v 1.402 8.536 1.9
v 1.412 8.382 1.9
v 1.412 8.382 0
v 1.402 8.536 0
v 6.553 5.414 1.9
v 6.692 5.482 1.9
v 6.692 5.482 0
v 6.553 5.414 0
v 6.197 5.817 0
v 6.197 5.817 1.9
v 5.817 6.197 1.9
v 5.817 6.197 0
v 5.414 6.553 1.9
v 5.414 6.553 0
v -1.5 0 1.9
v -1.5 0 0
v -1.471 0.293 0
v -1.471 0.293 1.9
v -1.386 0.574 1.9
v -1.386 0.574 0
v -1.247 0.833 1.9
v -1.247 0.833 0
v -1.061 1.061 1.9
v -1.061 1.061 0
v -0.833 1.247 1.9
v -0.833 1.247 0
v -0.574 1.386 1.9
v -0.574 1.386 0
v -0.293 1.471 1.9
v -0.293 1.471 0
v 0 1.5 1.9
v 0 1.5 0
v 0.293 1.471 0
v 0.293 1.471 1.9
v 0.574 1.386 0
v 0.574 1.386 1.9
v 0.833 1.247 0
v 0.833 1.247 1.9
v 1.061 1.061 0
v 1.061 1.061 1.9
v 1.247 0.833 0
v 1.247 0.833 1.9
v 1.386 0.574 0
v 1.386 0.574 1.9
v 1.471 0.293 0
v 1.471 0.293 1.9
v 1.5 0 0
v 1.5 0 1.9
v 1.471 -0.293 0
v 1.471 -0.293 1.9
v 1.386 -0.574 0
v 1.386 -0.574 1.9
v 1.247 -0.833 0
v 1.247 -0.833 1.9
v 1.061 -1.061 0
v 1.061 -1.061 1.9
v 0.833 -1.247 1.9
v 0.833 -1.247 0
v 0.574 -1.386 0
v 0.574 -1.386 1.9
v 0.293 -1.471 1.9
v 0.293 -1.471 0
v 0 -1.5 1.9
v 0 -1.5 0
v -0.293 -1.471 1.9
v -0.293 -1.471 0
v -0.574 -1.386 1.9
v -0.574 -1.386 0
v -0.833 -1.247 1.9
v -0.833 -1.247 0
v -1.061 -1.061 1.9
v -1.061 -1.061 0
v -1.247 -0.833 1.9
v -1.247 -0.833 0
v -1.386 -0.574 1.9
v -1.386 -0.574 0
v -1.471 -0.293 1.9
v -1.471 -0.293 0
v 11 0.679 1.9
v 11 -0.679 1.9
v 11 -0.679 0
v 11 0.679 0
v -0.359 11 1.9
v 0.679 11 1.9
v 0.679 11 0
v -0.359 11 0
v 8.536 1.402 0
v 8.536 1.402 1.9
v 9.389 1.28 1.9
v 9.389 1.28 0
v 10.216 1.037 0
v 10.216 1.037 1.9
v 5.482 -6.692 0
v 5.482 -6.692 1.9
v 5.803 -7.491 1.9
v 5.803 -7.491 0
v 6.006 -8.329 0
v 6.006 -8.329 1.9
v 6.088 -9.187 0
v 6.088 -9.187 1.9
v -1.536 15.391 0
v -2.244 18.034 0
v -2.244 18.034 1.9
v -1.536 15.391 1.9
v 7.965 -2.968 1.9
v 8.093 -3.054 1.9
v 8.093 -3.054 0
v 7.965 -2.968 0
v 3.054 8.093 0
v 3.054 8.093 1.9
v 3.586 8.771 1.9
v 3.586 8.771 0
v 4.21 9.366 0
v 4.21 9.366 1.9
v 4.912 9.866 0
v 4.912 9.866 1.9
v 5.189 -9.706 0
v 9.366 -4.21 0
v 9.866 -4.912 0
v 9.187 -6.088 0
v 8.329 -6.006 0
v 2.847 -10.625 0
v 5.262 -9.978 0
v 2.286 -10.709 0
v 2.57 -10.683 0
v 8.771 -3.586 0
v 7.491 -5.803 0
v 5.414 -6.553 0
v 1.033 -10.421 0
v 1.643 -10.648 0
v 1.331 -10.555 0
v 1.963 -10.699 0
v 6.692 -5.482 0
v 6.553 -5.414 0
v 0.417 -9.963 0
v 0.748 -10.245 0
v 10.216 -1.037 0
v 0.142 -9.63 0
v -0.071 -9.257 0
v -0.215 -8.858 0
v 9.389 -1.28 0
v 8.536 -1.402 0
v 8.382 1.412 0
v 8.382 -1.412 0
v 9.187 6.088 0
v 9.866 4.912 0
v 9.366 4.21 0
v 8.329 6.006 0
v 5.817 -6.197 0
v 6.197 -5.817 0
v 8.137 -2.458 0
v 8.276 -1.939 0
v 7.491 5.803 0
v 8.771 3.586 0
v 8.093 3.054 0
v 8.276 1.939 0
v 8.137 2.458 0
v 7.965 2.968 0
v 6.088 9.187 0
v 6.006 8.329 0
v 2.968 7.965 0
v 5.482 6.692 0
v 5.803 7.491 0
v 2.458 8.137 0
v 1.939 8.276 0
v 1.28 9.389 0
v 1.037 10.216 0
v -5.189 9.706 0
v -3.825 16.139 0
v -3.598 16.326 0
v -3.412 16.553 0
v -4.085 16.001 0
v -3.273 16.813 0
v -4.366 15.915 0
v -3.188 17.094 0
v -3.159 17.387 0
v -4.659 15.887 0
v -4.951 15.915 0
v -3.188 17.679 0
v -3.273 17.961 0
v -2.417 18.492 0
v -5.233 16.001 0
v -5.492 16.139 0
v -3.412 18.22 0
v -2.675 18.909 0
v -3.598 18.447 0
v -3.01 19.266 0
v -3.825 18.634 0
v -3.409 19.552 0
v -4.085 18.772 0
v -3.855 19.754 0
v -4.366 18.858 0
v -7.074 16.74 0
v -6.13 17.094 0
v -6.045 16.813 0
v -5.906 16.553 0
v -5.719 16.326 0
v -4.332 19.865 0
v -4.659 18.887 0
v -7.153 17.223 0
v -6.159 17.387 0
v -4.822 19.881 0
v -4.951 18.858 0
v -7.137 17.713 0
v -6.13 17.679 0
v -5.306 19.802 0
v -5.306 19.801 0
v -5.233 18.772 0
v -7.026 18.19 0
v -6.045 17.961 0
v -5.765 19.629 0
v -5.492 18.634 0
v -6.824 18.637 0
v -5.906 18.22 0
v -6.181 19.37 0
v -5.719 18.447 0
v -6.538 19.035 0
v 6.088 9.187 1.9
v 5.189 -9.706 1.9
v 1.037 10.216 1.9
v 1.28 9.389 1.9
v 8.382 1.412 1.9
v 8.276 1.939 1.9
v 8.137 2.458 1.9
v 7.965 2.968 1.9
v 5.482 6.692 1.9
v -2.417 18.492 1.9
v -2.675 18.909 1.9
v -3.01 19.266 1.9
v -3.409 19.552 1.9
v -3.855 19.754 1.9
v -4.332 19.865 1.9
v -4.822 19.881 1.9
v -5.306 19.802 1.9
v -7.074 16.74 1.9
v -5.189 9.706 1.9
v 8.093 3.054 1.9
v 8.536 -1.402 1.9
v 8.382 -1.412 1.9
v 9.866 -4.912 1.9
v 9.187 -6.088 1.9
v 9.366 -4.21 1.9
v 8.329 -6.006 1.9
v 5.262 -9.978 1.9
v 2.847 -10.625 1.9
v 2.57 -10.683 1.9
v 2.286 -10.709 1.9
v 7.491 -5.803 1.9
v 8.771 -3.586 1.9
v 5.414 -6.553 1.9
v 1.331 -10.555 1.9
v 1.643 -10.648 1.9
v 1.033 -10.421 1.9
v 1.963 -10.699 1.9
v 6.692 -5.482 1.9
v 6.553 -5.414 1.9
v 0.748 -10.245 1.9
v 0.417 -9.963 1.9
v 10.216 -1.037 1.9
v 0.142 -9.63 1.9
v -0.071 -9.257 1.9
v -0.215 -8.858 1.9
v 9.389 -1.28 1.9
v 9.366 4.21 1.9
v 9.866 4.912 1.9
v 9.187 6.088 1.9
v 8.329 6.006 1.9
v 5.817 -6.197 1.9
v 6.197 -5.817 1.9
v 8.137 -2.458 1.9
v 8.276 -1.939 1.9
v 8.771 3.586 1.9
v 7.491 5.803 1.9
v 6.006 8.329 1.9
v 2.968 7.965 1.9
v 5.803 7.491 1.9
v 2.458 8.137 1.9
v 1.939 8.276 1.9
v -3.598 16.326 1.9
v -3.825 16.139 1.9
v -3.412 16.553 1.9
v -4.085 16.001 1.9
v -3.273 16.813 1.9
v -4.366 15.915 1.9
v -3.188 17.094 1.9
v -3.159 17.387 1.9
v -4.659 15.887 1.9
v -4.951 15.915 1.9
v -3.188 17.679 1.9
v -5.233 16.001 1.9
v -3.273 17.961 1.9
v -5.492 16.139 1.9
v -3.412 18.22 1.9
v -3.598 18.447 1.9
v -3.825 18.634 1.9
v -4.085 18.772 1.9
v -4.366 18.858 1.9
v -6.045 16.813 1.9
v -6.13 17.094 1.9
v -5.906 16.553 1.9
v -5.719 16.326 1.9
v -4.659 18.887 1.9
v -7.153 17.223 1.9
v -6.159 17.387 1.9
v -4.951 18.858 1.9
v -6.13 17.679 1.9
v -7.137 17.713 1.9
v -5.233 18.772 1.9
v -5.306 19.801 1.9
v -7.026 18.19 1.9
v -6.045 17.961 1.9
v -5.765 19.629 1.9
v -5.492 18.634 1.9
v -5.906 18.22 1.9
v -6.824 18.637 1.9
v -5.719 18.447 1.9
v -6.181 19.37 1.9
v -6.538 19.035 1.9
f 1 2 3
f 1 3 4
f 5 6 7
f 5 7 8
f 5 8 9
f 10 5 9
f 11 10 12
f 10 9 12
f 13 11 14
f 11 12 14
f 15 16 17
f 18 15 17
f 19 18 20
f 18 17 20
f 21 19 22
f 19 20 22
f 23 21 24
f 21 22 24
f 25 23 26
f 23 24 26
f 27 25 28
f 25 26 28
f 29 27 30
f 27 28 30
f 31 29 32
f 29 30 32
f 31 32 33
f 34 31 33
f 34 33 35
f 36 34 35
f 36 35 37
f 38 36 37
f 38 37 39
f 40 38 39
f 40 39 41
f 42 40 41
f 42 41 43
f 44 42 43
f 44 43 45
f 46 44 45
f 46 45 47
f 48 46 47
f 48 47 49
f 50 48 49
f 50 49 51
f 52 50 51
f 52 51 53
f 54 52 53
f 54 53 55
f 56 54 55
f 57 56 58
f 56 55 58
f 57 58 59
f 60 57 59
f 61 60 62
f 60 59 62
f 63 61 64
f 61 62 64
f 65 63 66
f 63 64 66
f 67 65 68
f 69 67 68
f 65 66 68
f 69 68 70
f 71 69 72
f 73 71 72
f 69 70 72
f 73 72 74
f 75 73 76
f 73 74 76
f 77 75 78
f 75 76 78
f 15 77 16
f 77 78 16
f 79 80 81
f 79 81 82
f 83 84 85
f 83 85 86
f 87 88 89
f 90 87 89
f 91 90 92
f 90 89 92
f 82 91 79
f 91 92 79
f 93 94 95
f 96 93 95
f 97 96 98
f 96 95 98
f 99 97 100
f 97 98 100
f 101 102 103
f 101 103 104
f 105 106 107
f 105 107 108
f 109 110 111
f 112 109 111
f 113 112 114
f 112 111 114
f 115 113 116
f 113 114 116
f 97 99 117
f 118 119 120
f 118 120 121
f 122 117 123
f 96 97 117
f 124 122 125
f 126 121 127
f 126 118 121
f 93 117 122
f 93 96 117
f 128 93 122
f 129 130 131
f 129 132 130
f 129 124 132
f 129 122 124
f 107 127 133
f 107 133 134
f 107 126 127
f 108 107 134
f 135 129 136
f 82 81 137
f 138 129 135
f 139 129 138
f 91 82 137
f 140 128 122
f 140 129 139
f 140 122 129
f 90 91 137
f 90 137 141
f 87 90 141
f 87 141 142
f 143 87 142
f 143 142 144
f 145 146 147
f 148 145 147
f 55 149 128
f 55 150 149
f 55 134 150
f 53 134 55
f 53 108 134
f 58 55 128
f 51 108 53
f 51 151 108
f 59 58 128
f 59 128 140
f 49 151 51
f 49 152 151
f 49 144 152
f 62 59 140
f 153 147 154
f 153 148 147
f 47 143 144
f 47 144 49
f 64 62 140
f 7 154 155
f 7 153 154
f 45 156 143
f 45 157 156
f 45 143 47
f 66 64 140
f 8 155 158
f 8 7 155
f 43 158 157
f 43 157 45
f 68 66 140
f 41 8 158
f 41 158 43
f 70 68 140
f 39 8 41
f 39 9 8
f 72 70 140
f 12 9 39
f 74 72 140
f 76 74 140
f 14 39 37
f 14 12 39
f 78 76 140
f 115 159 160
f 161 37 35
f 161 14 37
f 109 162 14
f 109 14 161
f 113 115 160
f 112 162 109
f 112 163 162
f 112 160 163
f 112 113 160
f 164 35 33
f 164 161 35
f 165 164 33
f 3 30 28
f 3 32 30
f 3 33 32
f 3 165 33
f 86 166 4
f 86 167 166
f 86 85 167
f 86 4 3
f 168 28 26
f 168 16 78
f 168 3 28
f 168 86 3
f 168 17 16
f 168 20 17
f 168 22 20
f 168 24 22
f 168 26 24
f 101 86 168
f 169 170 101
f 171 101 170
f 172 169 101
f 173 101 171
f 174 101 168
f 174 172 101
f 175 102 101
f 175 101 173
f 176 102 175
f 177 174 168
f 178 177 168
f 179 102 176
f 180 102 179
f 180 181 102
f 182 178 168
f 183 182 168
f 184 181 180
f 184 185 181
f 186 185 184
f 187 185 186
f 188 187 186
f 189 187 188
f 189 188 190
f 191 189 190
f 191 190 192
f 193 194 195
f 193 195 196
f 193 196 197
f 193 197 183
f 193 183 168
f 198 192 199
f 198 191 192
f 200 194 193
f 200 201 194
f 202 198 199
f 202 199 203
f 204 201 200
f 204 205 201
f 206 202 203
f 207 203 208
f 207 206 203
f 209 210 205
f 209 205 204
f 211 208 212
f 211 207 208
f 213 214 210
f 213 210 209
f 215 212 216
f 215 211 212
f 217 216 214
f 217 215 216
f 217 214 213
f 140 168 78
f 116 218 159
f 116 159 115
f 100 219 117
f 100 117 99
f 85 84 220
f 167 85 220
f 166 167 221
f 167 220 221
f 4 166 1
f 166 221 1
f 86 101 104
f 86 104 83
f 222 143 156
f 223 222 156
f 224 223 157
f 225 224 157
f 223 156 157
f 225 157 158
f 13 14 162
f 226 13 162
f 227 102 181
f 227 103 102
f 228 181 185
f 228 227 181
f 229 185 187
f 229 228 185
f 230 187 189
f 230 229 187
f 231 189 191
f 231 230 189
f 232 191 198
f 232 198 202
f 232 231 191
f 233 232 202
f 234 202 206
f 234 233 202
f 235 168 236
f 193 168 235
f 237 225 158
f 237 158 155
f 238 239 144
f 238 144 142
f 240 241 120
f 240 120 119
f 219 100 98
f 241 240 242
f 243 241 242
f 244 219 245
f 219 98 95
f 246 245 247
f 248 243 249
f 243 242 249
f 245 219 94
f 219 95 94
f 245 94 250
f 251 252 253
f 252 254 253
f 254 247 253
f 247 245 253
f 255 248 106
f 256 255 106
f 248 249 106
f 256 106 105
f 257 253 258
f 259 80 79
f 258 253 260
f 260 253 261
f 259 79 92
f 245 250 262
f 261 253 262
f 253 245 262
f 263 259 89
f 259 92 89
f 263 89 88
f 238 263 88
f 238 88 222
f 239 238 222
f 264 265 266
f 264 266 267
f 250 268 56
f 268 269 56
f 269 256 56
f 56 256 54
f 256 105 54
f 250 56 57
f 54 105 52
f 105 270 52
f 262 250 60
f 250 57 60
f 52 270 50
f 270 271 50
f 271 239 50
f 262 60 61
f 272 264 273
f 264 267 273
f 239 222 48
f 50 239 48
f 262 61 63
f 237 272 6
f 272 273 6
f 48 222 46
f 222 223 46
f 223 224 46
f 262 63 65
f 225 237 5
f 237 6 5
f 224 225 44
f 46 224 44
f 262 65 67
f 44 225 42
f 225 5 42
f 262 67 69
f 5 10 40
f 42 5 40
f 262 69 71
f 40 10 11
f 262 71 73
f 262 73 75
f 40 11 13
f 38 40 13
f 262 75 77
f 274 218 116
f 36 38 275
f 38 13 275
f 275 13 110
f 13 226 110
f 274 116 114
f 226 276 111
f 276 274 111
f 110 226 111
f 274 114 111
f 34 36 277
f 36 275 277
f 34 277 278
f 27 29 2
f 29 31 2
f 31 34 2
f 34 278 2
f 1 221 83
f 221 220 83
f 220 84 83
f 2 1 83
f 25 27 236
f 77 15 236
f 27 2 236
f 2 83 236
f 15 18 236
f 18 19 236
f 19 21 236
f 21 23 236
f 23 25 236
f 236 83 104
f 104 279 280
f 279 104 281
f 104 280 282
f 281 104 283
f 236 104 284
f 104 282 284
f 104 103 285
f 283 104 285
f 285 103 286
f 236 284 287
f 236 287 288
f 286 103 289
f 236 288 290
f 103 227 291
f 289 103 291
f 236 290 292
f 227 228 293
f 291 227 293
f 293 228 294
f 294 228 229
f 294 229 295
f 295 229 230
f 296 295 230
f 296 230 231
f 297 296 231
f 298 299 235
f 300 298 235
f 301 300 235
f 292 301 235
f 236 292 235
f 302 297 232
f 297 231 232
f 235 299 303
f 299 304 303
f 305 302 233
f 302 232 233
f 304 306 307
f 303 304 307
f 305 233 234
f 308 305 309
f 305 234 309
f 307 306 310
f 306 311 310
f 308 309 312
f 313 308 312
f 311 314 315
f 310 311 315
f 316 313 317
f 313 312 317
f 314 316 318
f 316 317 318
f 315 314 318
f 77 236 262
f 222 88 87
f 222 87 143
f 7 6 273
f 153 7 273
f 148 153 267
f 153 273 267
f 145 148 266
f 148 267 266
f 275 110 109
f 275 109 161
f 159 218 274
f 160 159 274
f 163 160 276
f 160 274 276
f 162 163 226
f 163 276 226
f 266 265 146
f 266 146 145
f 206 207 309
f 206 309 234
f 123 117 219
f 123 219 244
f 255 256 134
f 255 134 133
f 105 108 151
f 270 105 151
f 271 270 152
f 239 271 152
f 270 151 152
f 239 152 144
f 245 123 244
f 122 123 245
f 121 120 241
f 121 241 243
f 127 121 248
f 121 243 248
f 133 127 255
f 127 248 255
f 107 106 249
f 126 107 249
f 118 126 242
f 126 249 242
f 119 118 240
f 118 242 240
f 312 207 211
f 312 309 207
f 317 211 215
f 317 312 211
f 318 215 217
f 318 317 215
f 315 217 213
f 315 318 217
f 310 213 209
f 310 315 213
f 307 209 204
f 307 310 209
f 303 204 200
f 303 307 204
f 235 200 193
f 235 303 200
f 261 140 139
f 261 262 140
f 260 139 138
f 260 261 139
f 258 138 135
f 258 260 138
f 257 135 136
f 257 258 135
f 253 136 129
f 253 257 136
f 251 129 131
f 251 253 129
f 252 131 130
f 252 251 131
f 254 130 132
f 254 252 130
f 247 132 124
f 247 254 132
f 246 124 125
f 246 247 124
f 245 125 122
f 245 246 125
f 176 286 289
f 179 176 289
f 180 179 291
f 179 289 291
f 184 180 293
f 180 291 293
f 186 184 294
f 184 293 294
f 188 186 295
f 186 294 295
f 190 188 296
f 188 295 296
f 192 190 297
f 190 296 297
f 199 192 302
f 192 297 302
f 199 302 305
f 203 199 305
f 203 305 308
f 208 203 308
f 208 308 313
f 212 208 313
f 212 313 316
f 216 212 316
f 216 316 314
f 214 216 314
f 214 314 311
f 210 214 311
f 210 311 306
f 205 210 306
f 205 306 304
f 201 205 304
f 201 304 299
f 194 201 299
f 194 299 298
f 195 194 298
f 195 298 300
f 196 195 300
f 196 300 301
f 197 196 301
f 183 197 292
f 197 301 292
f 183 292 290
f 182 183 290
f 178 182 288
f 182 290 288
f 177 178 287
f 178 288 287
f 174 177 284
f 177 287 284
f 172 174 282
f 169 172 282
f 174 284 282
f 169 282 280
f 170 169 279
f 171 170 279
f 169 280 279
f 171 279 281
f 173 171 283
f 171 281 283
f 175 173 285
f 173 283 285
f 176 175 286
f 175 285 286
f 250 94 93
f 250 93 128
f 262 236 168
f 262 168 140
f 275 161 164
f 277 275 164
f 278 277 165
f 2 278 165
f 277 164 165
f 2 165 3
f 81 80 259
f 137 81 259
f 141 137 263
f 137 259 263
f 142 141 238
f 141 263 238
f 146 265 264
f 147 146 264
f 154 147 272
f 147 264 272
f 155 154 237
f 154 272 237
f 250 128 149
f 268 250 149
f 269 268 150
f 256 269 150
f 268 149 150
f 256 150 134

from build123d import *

# Parameters (mm, degrees)
SKETCH1_R           = 8.5
BOSS_EXTRUDE1_DEPTH = 1.9
BOSS_EXTRUDE2_DEPTH = 1.9
CIRPATTERN2_COUNT   = 12
FILLET5_R           = 6
FILLET6_R           = 6
BOSS_EXTRUDE5_DEPTH = 1.9
SKETCH15_R          = 5
BOSS_EXTRUDE6_DEPTH = 1.9
SKETCH14_R          = 1.5
CUT_EXTRUDE7_DEPTH  = 24.297043988
CUT_EXTRUDE8_DEPTH  = 24.297043988
SKETCH17_R          = 1.5
CUT_EXTRUDE9_DEPTH  = 24.297043988
FILLET7_R           = 2.5


# Some blends are built 0.0001 mm under size
with BuildPart() as part:
    # Sketch1 → Boss-Extrude1 (new body)
    with BuildSketch(Plane.XY):
        with Locations(Location((0, 0, 0), (0, 0, 180))):
            Circle(SKETCH1_R)
    extrude(amount=BOSS_EXTRUDE1_DEPTH)

    # Sketch3 → Boss-Extrude2 (add)
    with BuildSketch(Plane.XY.offset(1.9)):
        Polygon((-1.305261922, 9.914448614), (-1.509060022, 7), (1.509060022, 7), (1.305261922, 9.914448614), (0.678518537, 11), (-0.678518537, 11), align=None)
    boss_extrude2 = extrude(amount=-BOSS_EXTRUDE2_DEPTH)

    # CirPattern2: Boss-Extrude2 ×12 about axis
    cirpattern2_axis = Axis((0, 0, 0), (0, 0, 1))
    for i in range(1, CIRPATTERN2_COUNT):
        add(boss_extrude2.rotate(cirpattern2_axis, i * 360 / CIRPATTERN2_COUNT))

    # Fillet5
    # the kernel refuses this fillet: 6 mm, written as the material it takes off along each edge
    with BuildSketch(Plane(origin=(9.238795325, 3.826834324, 5.354382408), x_dir=(0.49999999999981276, 0.8660254037845467, 0), z_dir=(0, 0, -1)), Plane(origin=(1.305261922, 9.914448614, 5.354382408), x_dir=(-0.5000000000001841, 0.8660254037843323, 0), z_dir=(0, 0, -1)), Plane(origin=(-7.933533403, 6.08761429, 5.354382408), x_dir=(-1, 0, 0), z_dir=(0, 0, -1)), Plane(origin=(-9.914448614, 1.305261922, 5.354382408), x_dir=(-0.8660254037843321, -0.5000000000001844, 0), z_dir=(0, 0, -1)), Plane(origin=(-9.238795325, -3.826834324, 5.354382408), x_dir=(-0.49999999999981826, -0.8660254037845436, 0), z_dir=(0, 0, -1)), Plane(origin=(-6.08761429, -7.933533403, 5.354382408), x_dir=(0, -1, 0), z_dir=(0, 0, -1)), Plane(origin=(3.826834324, -9.238795325, 5.354382408), x_dir=(0.8660254037845474, -0.49999999999981154, 0), z_dir=(0, 0, -1)), Plane(origin=(7.933533403, -6.08761429, 5.354382408), x_dir=(1, 0, 0), z_dir=(0, 0, -1)), Plane(origin=(9.914448614, -1.305261922, 5.354382408), x_dir=(0.866025403784333, 0.500000000000183, 0), z_dir=(0, 0, -1))) as fillet5_piece_1:
        with BuildLine():
            CenterArc((1.388315544, -5.998484909), FILLET5_R, 91.287628333, 24.712371667)
            Line((-1.241911337, -0.605720631), (-1.294515874, -0.497865346))
            Line((-1.294515874, -0.497865346), (-0.052604538, 0.107855286))
            Line((-0.052604538, 0.107855286), (0, 0.12))
            ThreePointArc((0, 0.12), (0.626743385, 0.12), (1.250790195, 0.119969698))
            Line((1.250790195, 0.119969698), (1.25348677, 0))
        make_face()
    extrude(amount=8.808764816, mode=Mode.SUBTRACT)
    with BuildSketch(Plane(origin=(6.08761429, 7.933533403, 5.354382408), x_dir=(-0.4383711467890806, -0.8987940462991654, 0), z_dir=(0, 0, -1)), Plane(origin=(-3.826834324, 9.238795325, 5.354382408), x_dir=(0.5591929034707432, -0.8290375725550441, 0), z_dir=(0, 0, -1)), Plane(origin=(-1.305261922, -9.914448614, 5.354382408), x_dir=(-0.06975647374412203, 0.9975640502598244, 0), z_dir=(0, 0, -1))) as fillet5_piece_2:
        with BuildLine():
            CenterArc((1.381752963, 6), FILLET5_R, 245.287628333, 24.712371667)
            Line((-1.126626446, 0.549492433), (-1.176794034, 0.440482282))
            ThreePointArc((-1.176794034, 0.440482282), (-0.615917761, 0.166890931), (-0.052604538, -0.107855286))
            Line((-0.052604538, -0.107855286), (0, -0.12))
            Line((0, -0.12), (1.381752963, -0.12))
            Line((1.381752963, -0.12), (1.381752963, 0))
        make_face()
    extrude(amount=8.808764816, mode=Mode.SUBTRACT)

    # Fillet6
    # the kernel refuses this fillet: 6 mm, written as the material it takes off along each edge
    with BuildSketch(Plane(origin=(7.933533403, 6.08761429, 5.354382408), x_dir=(-0.8987940462991681, -0.4383711467890751, 0), z_dir=(0, 0, -1)), Plane(origin=(3.826834324, 9.238795325, 5.354382408), x_dir=(-0.5591929034707512, -0.8290375725550386, 0), z_dir=(0, 0, -1)), Plane(origin=(-1.305261922, 9.914448614, 5.354382408), x_dir=(-0.06975647374412959, -0.9975640502598239, 0), z_dir=(0, 0, -1)), Plane(origin=(-6.08761429, 7.933533403, 5.354382408), x_dir=(0.43837114678907496, -0.8987940462991681, 0), z_dir=(0, 0, -1)), Plane(origin=(-9.238795325, 3.826834324, 5.354382408), x_dir=(0.8290375725550395, -0.5591929034707501, 0), z_dir=(0, 0, -1)), Plane(origin=(-9.914448614, -1.305261922, 5.354382408), x_dir=(0.9975640502598241, -0.0697564737441288, 0), z_dir=(0, 0, -1)), Plane(origin=(-7.933533403, -6.08761429, 5.354382408), x_dir=(0.8987940462991686, 0.4383711467890744, 0), z_dir=(0, 0, -1)), Plane(origin=(-3.826834324, -9.238795325, 5.354382408), x_dir=(0.5591929034707488, 0.8290375725550403, 0), z_dir=(0, 0, -1)), Plane(origin=(1.305261922, -9.914448614, 5.354382408), x_dir=(0.06975647374412966, 0.9975640502598239, 0), z_dir=(0, 0, -1)), Plane(origin=(6.08761429, -7.933533403, 5.354382408), x_dir=(-0.4383711467890749, 0.8987940462991683, 0), z_dir=(0, 0, -1)), Plane(origin=(9.238795325, -3.826834324, 5.354382408), x_dir=(-0.8290375725550393, 0.5591929034707505, 0), z_dir=(0, 0, -1)), Plane(origin=(9.914448614, 1.305261922, 5.354382408), x_dir=(-0.9975640502598239, 0.06975647374412894, 0), z_dir=(0, 0, -1))) as fillet6_piece_1:
        with BuildLine():
            CenterArc((1.381752963, -6), FILLET6_R, 90, 24.712371667)
            Line((-1.126626446, -0.549492433), (-1.176794034, -0.440482282))
            ThreePointArc((-1.176794034, -0.440482282), (-0.615917761, -0.166890931), (-0.052604538, 0.107855286))
            Line((-0.052604538, 0.107855286), (0, 0.12))
            Line((0, 0.12), (1.381752963, 0.12))
            Line((1.381752963, 0.12), (1.381752963, 0))
        make_face()
    extrude(amount=8.808764816, mode=Mode.SUBTRACT)

    # Sketch12 → Boss-Extrude5 (add)
    with BuildSketch(Plane(origin=(0, 0, 0), x_dir=(-1, 0, 0), z_dir=(0, 0, -1))):
        Polygon((1.535905814, 15.391336798), (-5.261824062, -9.978136476), (-0.43219493, -11.272231702), (7.72060499, 19.154431826), (2.890975859, 20.448527052), align=None)
    extrude(amount=-BOSS_EXTRUDE5_DEPTH)

    # Sketch15 → Boss-Extrude6 (add)
    with BuildSketch(Plane(origin=(0, 0, 0), x_dir=(-1, 0, 0), z_dir=(0, 0, -1))):
        Circle(SKETCH15_R)
    extrude(amount=-BOSS_EXTRUDE6_DEPTH)

    # Sketch14 → Cut-Extrude7 (cut, through all)
    with BuildSketch(Plane(origin=(0, 0, 0), x_dir=(-1, 0, 0), z_dir=(0, 0, -1))):
        Circle(SKETCH14_R)
    extrude(amount=-CUT_EXTRUDE7_DEPTH, mode=Mode.SUBTRACT)

    # Sketch16 → Cut-Extrude8 (cut, through all)
    with BuildSketch(Plane.XY.offset(1.9)):
        Polygon((-5.659024027, 11.460506927), (0.43219493, -11.272231702), (-8.69145043, -13.716905108), (-14.782669387, 9.015833521), align=None)
    extrude(amount=-CUT_EXTRUDE8_DEPTH, mode=Mode.SUBTRACT)

    # Sketch17 → Cut-Extrude9 (cut, through all)
    with BuildSketch(Plane.XY.offset(1.9)):
        with Locations((-4.658742812, 17.386664873)):
            Circle(SKETCH17_R)
    extrude(amount=-CUT_EXTRUDE9_DEPTH, mode=Mode.SUBTRACT)

    # Fillet7
    fillet7_edges = [part.edges().sort_by_distance(p)[0] for p in [
        (-7.72060499, 19.154431826, 0.95),
        (-2.890975859, 20.448527052, 0.95),
        (0.43219493, -11.272231702, 0.95),
    ]]
    fillet(fillet7_edges, radius=FILLET7_R - 0.0001)  # a hair under: the kernel refuses the full size


solid = part.part
